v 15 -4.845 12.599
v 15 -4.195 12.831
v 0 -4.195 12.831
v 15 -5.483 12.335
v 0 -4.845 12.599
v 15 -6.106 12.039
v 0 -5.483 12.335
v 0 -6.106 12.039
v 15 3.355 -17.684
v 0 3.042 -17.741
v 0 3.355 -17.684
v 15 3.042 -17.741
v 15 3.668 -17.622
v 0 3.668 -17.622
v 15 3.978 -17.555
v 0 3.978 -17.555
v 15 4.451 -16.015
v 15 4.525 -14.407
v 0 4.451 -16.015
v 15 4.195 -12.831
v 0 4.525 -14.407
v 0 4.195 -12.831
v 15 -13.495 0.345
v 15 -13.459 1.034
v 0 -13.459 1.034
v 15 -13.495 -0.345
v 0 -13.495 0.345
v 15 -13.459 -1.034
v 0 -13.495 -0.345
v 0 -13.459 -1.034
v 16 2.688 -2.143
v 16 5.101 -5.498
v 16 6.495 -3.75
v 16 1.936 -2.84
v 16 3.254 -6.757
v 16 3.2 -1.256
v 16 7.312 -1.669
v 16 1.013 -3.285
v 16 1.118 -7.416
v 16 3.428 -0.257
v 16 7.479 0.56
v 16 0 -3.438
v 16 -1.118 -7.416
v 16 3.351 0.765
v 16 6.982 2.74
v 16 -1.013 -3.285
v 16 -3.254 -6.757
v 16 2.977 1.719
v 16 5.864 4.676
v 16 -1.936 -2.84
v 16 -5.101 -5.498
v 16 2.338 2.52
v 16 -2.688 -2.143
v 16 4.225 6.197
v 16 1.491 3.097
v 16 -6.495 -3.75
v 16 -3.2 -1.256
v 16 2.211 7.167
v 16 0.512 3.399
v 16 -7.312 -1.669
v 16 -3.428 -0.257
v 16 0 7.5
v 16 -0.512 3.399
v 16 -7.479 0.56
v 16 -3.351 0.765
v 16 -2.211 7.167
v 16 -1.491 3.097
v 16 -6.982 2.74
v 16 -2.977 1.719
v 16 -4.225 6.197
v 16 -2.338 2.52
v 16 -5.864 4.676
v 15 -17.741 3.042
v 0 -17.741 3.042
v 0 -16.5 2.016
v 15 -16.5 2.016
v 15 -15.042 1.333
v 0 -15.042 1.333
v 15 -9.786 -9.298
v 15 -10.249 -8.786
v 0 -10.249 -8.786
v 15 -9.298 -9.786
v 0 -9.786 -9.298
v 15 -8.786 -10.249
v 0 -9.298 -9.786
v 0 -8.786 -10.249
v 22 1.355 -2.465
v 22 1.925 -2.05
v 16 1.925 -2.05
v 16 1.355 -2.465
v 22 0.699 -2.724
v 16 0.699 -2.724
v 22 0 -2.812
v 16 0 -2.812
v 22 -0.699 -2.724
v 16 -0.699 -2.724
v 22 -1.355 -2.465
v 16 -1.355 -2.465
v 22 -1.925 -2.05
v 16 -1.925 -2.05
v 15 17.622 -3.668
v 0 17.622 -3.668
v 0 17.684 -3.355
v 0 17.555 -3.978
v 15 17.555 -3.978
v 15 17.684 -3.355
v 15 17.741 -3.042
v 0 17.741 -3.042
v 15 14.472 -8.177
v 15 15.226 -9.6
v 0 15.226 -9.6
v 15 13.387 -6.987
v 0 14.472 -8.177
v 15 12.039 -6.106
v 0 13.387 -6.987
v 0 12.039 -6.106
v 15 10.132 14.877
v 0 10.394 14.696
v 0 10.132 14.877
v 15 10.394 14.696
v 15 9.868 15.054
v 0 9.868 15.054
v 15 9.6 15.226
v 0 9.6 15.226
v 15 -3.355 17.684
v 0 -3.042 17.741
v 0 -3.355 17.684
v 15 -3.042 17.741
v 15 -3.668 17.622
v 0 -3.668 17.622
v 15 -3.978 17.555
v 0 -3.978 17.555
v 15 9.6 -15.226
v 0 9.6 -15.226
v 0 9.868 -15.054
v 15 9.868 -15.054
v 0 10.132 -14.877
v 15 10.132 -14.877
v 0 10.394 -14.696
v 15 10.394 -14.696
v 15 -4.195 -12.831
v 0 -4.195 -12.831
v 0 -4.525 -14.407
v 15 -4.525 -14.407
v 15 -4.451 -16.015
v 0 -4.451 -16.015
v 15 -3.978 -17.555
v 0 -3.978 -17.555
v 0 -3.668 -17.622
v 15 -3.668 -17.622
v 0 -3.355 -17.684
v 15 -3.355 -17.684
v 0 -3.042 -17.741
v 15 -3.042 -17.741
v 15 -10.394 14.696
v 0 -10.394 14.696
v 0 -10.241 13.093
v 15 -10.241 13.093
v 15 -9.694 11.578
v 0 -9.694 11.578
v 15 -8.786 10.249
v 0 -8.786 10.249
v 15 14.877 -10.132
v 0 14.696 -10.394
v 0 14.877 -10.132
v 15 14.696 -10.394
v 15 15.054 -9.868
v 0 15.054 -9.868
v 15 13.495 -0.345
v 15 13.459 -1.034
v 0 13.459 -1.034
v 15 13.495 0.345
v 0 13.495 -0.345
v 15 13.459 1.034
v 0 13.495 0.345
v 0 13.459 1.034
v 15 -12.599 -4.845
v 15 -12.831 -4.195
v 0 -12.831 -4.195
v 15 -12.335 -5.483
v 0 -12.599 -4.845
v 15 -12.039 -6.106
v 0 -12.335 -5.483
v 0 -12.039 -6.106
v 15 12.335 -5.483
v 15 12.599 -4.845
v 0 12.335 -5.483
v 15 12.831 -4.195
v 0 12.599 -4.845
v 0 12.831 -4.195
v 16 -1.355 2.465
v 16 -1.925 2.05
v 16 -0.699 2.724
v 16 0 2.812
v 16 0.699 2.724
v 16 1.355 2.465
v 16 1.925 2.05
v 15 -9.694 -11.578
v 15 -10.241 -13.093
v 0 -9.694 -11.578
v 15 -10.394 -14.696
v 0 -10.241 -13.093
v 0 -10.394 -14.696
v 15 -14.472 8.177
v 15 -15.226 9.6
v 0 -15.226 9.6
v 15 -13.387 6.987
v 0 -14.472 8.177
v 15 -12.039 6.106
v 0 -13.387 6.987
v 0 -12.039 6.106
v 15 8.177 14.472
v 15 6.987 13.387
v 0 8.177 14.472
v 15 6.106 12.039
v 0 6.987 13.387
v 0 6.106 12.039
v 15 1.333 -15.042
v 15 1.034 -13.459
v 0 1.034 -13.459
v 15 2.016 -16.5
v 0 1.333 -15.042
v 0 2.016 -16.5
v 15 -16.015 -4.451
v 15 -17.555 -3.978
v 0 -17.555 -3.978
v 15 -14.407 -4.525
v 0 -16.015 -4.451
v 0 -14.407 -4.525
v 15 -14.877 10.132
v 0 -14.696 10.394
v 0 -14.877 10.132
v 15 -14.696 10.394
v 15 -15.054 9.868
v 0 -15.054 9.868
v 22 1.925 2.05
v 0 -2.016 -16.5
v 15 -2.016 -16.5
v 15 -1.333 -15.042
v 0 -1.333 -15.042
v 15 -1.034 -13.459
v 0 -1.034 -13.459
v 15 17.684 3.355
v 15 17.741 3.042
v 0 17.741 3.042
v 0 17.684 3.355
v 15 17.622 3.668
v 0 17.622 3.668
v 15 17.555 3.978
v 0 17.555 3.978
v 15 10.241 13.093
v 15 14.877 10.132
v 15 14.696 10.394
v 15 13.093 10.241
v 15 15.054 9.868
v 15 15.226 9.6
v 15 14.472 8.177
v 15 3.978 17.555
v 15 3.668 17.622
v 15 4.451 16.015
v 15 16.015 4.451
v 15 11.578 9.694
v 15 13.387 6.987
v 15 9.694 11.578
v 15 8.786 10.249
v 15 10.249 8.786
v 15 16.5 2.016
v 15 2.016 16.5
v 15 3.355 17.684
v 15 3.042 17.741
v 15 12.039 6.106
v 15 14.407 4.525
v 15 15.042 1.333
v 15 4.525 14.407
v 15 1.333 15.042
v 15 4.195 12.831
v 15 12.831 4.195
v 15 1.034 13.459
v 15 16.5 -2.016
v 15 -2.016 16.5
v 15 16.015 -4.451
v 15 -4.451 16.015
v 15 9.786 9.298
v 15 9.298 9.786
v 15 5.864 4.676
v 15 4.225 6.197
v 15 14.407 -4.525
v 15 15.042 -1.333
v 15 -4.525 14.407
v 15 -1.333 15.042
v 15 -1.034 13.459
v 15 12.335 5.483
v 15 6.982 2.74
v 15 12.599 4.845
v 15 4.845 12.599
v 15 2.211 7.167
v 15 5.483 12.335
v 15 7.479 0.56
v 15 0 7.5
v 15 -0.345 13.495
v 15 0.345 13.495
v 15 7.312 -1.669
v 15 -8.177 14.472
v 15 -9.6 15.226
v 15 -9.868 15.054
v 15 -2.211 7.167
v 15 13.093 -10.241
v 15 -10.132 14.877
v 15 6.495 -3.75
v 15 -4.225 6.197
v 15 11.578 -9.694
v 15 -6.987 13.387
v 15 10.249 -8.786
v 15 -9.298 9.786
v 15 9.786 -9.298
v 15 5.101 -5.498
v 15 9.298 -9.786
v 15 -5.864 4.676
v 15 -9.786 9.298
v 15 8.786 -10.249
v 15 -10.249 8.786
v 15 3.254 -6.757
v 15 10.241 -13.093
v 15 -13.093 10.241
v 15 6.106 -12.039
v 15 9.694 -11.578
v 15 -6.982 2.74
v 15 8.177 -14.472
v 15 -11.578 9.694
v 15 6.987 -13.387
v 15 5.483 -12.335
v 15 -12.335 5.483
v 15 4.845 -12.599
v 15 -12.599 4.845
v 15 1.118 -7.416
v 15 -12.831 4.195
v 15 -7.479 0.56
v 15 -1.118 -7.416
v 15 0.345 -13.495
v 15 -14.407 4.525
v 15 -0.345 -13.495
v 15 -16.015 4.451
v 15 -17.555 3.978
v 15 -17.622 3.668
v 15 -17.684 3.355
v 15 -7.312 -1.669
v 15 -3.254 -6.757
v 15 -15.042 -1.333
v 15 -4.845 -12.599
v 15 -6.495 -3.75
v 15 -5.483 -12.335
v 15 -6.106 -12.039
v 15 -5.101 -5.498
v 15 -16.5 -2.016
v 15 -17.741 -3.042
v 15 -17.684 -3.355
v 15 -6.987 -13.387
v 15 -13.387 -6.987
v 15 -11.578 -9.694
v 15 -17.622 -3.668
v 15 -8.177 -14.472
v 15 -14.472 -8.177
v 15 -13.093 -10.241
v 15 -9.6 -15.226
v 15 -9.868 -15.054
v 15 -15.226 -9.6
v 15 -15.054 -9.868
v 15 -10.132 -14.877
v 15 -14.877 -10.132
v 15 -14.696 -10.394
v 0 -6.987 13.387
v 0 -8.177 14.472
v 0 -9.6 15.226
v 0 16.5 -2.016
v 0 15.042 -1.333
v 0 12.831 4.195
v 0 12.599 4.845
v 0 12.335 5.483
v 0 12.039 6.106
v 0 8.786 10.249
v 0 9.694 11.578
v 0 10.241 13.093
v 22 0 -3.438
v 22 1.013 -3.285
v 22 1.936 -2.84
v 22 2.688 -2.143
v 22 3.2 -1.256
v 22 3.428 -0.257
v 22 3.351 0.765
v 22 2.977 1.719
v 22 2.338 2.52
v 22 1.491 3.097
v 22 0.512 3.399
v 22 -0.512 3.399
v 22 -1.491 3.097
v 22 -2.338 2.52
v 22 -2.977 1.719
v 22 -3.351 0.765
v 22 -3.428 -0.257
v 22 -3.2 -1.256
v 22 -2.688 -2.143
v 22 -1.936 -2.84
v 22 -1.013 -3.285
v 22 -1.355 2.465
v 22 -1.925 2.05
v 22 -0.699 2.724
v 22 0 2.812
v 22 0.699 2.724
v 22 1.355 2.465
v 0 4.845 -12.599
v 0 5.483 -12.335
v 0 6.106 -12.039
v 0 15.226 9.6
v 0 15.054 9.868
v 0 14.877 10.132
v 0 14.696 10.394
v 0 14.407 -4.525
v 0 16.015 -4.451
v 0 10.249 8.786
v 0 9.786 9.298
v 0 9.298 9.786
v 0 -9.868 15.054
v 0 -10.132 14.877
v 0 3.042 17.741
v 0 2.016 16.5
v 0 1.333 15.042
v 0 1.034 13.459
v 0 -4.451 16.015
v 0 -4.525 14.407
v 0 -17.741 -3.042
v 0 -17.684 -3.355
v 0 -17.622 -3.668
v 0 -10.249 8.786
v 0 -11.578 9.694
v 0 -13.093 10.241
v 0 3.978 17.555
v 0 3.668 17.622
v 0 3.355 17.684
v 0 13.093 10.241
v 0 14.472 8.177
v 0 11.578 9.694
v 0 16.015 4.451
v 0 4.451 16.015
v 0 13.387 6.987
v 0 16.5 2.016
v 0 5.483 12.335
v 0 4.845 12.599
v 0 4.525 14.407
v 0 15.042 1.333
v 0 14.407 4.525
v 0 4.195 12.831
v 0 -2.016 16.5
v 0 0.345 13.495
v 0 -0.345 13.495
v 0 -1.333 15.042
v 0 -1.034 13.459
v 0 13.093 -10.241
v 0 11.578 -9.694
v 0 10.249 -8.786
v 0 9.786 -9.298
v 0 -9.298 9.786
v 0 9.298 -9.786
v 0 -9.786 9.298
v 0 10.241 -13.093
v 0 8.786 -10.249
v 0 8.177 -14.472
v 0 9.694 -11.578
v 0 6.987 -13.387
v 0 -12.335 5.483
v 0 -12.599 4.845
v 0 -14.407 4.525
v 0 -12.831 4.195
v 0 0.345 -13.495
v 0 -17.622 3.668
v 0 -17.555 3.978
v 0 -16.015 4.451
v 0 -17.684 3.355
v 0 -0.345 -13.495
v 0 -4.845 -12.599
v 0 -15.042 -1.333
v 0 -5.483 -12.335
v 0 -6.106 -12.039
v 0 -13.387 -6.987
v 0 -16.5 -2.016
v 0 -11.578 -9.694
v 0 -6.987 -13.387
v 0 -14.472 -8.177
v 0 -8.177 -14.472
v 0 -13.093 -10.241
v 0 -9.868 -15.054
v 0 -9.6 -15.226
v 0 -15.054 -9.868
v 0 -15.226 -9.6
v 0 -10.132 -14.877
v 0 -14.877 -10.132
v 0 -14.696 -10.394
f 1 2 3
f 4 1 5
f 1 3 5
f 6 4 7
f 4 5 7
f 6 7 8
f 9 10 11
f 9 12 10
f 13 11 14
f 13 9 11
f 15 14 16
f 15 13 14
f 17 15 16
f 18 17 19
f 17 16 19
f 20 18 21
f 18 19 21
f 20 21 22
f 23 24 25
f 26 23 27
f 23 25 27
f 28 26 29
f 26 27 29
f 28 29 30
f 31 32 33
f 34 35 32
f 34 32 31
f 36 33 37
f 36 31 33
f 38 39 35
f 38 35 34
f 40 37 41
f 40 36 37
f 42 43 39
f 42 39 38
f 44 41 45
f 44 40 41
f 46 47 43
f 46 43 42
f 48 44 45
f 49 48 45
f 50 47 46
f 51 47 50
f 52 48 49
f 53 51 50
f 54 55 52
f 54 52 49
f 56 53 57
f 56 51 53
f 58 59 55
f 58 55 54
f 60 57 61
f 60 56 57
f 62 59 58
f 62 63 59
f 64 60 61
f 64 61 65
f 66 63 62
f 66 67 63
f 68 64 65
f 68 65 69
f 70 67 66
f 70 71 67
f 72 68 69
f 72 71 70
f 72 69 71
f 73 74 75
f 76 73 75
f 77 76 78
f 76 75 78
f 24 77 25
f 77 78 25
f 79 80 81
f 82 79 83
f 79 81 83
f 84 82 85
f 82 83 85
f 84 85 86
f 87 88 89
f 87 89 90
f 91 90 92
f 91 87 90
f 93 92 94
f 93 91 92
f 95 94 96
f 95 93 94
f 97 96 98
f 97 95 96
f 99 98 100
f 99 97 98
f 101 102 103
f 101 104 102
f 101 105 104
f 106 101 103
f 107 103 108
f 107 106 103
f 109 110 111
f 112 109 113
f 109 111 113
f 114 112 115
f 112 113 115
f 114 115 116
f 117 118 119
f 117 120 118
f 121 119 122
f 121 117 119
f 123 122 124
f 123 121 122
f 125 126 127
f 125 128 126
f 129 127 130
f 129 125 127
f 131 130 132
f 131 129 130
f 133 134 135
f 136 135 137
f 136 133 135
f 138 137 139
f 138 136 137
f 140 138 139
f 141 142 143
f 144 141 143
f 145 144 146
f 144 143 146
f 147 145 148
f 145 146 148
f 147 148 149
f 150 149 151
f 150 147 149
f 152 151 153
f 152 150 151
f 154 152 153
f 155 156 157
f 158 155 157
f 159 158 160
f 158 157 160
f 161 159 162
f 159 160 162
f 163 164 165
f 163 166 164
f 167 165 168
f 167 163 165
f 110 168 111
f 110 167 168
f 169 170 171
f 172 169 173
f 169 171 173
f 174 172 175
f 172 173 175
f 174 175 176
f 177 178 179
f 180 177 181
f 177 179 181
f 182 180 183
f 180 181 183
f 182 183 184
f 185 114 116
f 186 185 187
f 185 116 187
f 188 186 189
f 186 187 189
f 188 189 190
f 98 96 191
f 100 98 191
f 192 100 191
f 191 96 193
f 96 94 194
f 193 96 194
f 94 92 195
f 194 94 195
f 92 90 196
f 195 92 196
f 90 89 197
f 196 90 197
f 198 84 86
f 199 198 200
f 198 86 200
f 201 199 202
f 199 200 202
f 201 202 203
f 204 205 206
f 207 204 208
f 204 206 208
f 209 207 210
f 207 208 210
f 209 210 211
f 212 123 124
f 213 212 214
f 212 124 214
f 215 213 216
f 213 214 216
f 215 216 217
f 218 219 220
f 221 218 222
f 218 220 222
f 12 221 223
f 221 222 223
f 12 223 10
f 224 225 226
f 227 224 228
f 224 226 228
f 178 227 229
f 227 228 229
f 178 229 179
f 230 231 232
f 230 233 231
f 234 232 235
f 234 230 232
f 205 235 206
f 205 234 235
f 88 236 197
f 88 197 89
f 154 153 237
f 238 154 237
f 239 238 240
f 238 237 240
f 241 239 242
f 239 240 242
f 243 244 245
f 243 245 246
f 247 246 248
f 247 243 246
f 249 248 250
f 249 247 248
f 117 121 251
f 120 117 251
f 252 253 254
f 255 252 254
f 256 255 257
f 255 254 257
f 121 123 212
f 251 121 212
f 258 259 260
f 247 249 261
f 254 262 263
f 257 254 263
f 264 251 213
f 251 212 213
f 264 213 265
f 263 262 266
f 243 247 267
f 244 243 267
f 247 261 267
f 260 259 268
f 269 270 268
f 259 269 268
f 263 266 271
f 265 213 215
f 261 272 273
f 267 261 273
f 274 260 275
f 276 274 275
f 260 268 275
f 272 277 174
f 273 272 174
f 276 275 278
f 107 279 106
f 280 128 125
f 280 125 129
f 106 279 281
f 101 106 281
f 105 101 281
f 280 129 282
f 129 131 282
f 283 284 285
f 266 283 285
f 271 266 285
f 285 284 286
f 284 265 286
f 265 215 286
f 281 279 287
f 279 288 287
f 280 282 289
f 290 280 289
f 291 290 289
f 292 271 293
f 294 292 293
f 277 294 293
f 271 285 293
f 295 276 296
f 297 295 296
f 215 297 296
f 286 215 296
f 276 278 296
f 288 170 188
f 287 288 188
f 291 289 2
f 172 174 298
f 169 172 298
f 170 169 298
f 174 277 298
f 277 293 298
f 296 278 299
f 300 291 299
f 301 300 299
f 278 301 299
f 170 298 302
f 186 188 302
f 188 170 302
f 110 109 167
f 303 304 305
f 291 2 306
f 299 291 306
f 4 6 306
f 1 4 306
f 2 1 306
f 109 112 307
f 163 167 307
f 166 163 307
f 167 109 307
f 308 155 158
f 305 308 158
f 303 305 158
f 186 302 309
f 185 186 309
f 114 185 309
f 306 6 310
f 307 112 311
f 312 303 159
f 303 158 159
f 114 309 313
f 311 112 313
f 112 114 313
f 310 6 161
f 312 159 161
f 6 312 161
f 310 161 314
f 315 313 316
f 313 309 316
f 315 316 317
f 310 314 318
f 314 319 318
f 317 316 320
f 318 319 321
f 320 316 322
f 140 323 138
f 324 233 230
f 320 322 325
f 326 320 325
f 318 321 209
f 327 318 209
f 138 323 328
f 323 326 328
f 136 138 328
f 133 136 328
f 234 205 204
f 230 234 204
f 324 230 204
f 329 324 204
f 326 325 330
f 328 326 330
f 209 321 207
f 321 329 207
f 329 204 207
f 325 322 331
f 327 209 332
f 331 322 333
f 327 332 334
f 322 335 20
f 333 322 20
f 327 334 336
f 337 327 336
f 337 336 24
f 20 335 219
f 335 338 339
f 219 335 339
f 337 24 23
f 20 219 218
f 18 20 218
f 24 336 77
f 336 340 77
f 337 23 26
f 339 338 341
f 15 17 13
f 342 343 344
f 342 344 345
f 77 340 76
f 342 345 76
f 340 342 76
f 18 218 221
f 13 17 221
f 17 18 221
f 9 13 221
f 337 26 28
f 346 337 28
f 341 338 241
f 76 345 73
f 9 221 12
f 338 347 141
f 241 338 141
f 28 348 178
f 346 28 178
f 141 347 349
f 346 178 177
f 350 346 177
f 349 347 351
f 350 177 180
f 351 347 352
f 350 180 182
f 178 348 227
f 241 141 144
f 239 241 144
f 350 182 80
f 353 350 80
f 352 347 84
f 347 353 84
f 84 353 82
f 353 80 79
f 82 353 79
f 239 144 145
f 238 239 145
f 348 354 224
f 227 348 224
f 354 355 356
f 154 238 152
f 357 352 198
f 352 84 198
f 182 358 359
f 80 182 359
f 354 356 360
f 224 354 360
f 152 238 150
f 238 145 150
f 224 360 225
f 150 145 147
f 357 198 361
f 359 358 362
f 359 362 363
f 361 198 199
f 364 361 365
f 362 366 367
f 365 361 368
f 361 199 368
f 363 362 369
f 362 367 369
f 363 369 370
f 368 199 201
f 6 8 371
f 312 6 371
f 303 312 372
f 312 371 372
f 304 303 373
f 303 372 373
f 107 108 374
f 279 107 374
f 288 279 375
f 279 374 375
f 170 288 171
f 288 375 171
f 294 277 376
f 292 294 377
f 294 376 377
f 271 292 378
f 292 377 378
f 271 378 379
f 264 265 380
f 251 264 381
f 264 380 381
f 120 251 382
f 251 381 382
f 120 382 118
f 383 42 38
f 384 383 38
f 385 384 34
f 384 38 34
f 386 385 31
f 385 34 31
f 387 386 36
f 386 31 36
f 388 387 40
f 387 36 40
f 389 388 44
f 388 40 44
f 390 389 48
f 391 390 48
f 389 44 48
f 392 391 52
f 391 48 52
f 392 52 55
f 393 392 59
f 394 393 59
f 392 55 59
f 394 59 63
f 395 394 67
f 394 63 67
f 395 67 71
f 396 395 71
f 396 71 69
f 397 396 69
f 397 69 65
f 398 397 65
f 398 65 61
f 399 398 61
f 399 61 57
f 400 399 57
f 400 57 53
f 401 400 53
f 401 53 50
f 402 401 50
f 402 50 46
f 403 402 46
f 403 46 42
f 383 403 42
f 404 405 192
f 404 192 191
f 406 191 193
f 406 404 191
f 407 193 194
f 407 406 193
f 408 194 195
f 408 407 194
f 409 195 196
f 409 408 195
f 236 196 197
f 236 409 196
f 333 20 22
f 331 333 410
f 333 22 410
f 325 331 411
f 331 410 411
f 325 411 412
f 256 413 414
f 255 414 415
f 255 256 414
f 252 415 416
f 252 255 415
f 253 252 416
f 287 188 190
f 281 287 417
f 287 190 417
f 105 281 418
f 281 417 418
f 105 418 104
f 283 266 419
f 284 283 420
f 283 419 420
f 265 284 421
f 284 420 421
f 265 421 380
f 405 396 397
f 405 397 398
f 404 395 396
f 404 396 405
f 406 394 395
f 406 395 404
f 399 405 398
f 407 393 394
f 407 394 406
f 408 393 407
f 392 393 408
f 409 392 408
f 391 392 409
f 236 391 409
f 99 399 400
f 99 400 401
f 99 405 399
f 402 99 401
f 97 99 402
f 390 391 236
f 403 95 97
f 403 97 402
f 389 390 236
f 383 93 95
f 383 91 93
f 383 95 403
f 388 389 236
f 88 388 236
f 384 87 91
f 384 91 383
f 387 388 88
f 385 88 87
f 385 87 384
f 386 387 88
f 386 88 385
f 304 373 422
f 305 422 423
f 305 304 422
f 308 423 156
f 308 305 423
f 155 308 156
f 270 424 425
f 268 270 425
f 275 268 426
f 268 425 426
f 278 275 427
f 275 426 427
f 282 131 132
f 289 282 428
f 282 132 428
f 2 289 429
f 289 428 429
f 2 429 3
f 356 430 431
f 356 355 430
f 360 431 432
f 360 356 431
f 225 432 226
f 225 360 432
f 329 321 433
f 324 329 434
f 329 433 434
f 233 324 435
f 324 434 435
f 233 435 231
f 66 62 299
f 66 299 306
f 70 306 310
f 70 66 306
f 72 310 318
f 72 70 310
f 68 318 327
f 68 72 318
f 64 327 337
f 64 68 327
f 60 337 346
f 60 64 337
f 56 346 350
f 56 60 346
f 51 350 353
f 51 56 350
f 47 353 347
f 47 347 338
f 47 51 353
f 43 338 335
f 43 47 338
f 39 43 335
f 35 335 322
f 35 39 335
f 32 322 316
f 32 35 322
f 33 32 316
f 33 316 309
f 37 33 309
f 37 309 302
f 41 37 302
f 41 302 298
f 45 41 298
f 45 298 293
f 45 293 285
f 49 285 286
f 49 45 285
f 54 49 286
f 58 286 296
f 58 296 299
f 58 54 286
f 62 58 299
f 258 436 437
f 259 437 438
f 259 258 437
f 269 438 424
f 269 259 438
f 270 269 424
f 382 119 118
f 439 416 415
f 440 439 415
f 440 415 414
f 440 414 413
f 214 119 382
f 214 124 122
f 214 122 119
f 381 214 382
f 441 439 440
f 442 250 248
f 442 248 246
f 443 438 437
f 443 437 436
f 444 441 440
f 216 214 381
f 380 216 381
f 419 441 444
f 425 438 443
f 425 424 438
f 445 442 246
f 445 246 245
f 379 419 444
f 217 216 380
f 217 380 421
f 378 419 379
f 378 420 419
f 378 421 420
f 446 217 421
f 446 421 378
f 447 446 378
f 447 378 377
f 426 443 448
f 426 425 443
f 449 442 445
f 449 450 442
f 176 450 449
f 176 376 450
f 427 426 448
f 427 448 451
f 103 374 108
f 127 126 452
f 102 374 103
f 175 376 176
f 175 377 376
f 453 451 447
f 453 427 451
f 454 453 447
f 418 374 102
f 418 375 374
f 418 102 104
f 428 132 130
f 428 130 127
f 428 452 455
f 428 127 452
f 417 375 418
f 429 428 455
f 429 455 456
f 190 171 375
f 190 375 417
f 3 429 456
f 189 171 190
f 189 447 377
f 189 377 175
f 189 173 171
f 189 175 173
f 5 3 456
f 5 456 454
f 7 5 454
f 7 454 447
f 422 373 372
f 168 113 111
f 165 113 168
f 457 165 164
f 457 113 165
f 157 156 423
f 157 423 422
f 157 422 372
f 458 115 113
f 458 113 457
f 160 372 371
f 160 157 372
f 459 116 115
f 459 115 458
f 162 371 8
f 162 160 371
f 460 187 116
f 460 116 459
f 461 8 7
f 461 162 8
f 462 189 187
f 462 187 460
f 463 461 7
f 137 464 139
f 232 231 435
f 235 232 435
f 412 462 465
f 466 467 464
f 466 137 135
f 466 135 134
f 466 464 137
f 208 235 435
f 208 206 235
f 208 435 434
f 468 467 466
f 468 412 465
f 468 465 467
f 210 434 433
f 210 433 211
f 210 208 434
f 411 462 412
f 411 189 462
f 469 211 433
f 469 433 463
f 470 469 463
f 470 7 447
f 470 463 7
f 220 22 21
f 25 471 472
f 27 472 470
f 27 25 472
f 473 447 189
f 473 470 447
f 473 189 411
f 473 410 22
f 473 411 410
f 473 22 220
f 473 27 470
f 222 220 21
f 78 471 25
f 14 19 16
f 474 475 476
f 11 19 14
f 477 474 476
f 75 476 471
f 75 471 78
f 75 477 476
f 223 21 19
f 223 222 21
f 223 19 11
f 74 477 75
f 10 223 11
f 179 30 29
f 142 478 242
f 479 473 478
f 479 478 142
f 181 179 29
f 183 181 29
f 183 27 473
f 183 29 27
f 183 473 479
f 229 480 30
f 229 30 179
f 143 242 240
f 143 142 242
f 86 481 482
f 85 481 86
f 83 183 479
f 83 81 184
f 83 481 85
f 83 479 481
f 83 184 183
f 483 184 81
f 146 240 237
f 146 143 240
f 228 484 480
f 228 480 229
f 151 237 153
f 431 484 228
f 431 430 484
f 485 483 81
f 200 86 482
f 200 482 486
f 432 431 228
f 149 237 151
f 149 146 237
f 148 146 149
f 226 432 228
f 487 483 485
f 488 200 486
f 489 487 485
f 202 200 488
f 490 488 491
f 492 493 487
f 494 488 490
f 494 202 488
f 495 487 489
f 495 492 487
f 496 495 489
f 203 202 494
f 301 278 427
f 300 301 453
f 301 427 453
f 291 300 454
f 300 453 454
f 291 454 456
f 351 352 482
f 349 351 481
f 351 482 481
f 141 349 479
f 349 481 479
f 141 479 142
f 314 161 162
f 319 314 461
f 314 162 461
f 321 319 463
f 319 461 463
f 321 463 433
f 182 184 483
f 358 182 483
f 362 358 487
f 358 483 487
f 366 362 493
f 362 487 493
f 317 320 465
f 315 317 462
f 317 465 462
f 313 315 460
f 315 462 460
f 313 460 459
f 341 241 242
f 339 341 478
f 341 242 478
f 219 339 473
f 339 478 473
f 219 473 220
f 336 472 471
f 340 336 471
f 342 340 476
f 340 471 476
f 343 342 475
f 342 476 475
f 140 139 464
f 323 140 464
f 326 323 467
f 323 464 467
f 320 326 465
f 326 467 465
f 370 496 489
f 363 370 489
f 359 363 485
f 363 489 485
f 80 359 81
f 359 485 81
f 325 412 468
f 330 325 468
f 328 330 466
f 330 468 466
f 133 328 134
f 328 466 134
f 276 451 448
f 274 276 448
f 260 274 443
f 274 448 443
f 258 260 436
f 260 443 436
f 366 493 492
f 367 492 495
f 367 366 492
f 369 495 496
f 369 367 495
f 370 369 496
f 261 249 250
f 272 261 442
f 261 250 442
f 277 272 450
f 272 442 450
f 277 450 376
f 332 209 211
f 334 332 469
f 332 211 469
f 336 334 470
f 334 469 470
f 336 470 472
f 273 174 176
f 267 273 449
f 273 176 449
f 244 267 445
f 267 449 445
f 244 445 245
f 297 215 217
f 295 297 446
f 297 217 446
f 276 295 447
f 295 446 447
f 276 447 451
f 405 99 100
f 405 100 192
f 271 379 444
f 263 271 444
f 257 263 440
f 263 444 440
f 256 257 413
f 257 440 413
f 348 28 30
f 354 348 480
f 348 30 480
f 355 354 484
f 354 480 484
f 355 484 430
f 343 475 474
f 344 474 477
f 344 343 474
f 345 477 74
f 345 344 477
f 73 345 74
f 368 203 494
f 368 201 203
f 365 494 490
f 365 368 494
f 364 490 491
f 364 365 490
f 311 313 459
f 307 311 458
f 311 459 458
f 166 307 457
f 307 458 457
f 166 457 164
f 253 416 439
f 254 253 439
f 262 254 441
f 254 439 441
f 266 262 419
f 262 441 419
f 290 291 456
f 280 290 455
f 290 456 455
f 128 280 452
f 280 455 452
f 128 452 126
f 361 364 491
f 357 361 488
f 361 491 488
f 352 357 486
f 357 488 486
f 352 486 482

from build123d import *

# Parameters (mm, degrees)
BASPROSKE_W         = 15
BASPROSKE_H         = 18
TOOTHCUT_DEPTH      = 30.546573405
TEETHCUTS_COUNT     = 16
TEETHCUTS_ANGLE     = 337.5
HUBNEABOTSKE_R      = 5
HUBNEARBOTH_DEPTH   = 15.0000254
HUBFAR_START        = 15.0000254
HUBFARSKE_R         = 5
HUBFAR_DEPTH        = 15.0000254
BORSKE_R            = 2.5
BORE_DEPTH          = 45.0000508
CUT_EXTRUDE1_START  = -15.0000254
SKETCH3_R           = 5
CUT_EXTRUDE1_DEPTH  = 15.0000254
BOSS_EXTRUDE1_START = -20
SKETCH5_R           = 2.5
BOSS_EXTRUDE1_DEPTH = 20
BOSS_EXTRUDE2_START = 1
SKETCH6_R           = 7.5
SKETCH6_R_2         = 5
BOSS_EXTRUDE2_DEPTH = 1
SKETCH7_R           = 7.5
SKETCH7_R_2         = 3.4375
CUT_EXTRUDE2_DEPTH  = 30.757152718
BOSS_EXTRUDE3_START = 10.0000254
SKETCH8_R           = 2.5
BOSS_EXTRUDE3_DEPTH = 10.0000254
SKETCH10_OUTSIDE_W  = 49.174
SKETCH10_OUTSIDE_H  = 49.174
SKETCH10_OUTSIDE_R  = 3.4375
CUT_EXTRUDE3_DEPTH  = 14.0000254
CUT_EXTRUDE4_START  = -8
SKETCH12_R          = 3.4375
CUT_EXTRUDE4_DEPTH  = 8


with BuildPart() as part:
    # BasProSke → Base-Revolve (revolve)
    with BuildSketch(Plane(origin=(0, 0, 0), x_dir=(1, 0, 0), z_dir=(0, 1, 0)), mode=Mode.PRIVATE) as base_revolve_sk:
        with Locations((7.5, 9)):
            Rectangle(BASPROSKE_W, BASPROSKE_H)
    revolve(base_revolve_sk.sketch.rotate(Axis((-10, 0, 0), (1, 0, 0)), 180), axis=Axis((-10, 0, 0), (1, 0, 0)))

    # TooCutSke → ToothCut (cut, through all)
    with BuildSketch(Plane(origin=(0, 0, 0), x_dir=(0, 0, -1), z_dir=(1, 0, 0))):
        with BuildLine():
            ThreePointArc((1.03434411, 13.459313997), (0, 13.499), (-1.03434411, 13.459313997))
            ThreePointArc((-1.03434411, 13.459313997), (-1.635143665, 15.806872195), (-3.065655864, 17.762792553))
            ThreePointArc((-3.065655864, 17.762792553), (0, 18.0254), (3.065655864, 17.762792553))
            ThreePointArc((3.065655864, 17.762792553), (1.635143665, 15.806872195), (1.03434411, 13.459313997))
        make_face()
    toothcut = extrude(amount=TOOTHCUT_DEPTH, mode=Mode.SUBTRACT)

    # TeethCuts: ToothCut ×16 about axis
    teethcuts_axis = Axis((-10, 0, 0), (1, 0, 0))
    for i in range(1, TEETHCUTS_COUNT):
        add(toothcut.rotate(teethcuts_axis, i * TEETHCUTS_ANGLE / (TEETHCUTS_COUNT - 1)), mode=Mode.SUBTRACT)

    # HubNeaBotSke → HubNearBoth (add)
    with BuildSketch(Plane.ZY):
        with Locations(Location((0, 0, 0), (0, 0, 180))):
            Circle(HUBNEABOTSKE_R)
    extrude(amount=HUBNEARBOTH_DEPTH)

    # HubFarSke → HubFar (add)
    with BuildSketch(Plane(origin=(15, 0, 0), x_dir=(0, 0, -1), z_dir=(1, 0, 0)).offset(HUBFAR_START)):
        Circle(HUBFARSKE_R)
    extrude(amount=-HUBFAR_DEPTH)

    # BorSke → Bore (cut, symmetric)
    with BuildSketch(Plane(origin=(0, 0, 0), x_dir=(0, 0, -1), z_dir=(1, 0, 0))):
        with Locations(Location((0, 0, 0), (0, 0, 180))):
            Circle(BORSKE_R)
    extrude(amount=BORE_DEPTH, both=True, mode=Mode.SUBTRACT)

    # Sketch3 → Cut-Extrude1 (cut)
    with BuildSketch(Plane.ZY.offset(15.0000254).offset(CUT_EXTRUDE1_START)):
        Circle(SKETCH3_R)
    extrude(amount=CUT_EXTRUDE1_DEPTH, mode=Mode.SUBTRACT)

    # Sketch5 → Boss-Extrude1 (add)
    with BuildSketch(Plane.ZY.offset(BOSS_EXTRUDE1_START)):
        Circle(SKETCH5_R)
    extrude(amount=BOSS_EXTRUDE1_DEPTH)

    # Sketch6 → Boss-Extrude2 (add)
    with BuildSketch(Plane(origin=(15, 0, 0), x_dir=(0, 0, -1), z_dir=(1, 0, 0)).offset(BOSS_EXTRUDE2_START)):
        with Locations(Location((0, 0, 0), (0, 0, 180))):
            Circle(SKETCH6_R)
        Circle(SKETCH6_R_2, mode=Mode.SUBTRACT)
    extrude(amount=-BOSS_EXTRUDE2_DEPTH)

    # Sketch7 → Cut-Extrude2 (cut, through all)
    with BuildSketch(Plane(origin=(16, 0, 0), x_dir=(0, 0, -1), z_dir=(1, 0, 0))):
        with Locations(Location((0, 0, 0), (0, 0, 180))):
            Circle(SKETCH7_R)
        Circle(SKETCH7_R_2, mode=Mode.SUBTRACT)
    extrude(amount=CUT_EXTRUDE2_DEPTH, mode=Mode.SUBTRACT)

    # Sketch8 → Boss-Extrude3 (add)
    with BuildSketch(Plane(origin=(20, 0, 0), x_dir=(0, 0, -1), z_dir=(1, 0, 0)).offset(BOSS_EXTRUDE3_START)):
        Circle(SKETCH8_R)
    extrude(amount=-BOSS_EXTRUDE3_DEPTH)

    # Sketch10 outside → Cut-Extrude3 (cut)
    # profile 1 of 2: a face of its own
    with BuildSketch(Plane(origin=(30.0000254, 0, 0), x_dir=(0, 0, -1), z_dir=(1, 0, 0))):
        Rectangle(SKETCH10_OUTSIDE_W, SKETCH10_OUTSIDE_H)
        Circle(SKETCH10_OUTSIDE_R, mode=Mode.SUBTRACT)
    # profile 2 of 2: a face of its own
    with BuildSketch(Plane(origin=(30.0000254, 0, 0), x_dir=(0, 0, -1), z_dir=(1, 0, 0))):
        with BuildLine():
            Line((-2.050495367, 1.925), (2.050495367, 1.925))
            ThreePointArc((2.050495367, 1.925), (2.8125, 0), (2.050495367, -1.925))
            Line((2.050495367, -1.925), (-2.050495367, -1.925))
            ThreePointArc((-2.050495367, -1.925), (-2.8125, 0), (-2.050495367, 1.925))
        make_face()
    extrude(amount=-CUT_EXTRUDE3_DEPTH, mode=Mode.SUBTRACT)

    # Sketch12 → Cut-Extrude4 (cut)
    with BuildSketch(Plane(origin=(30.0000254, 0, 0), x_dir=(0, 0, -1), z_dir=(1, 0, 0)).offset(CUT_EXTRUDE4_START)):
        Circle(SKETCH12_R)
    extrude(amount=CUT_EXTRUDE4_DEPTH, mode=Mode.SUBTRACT)


solid = part.part
